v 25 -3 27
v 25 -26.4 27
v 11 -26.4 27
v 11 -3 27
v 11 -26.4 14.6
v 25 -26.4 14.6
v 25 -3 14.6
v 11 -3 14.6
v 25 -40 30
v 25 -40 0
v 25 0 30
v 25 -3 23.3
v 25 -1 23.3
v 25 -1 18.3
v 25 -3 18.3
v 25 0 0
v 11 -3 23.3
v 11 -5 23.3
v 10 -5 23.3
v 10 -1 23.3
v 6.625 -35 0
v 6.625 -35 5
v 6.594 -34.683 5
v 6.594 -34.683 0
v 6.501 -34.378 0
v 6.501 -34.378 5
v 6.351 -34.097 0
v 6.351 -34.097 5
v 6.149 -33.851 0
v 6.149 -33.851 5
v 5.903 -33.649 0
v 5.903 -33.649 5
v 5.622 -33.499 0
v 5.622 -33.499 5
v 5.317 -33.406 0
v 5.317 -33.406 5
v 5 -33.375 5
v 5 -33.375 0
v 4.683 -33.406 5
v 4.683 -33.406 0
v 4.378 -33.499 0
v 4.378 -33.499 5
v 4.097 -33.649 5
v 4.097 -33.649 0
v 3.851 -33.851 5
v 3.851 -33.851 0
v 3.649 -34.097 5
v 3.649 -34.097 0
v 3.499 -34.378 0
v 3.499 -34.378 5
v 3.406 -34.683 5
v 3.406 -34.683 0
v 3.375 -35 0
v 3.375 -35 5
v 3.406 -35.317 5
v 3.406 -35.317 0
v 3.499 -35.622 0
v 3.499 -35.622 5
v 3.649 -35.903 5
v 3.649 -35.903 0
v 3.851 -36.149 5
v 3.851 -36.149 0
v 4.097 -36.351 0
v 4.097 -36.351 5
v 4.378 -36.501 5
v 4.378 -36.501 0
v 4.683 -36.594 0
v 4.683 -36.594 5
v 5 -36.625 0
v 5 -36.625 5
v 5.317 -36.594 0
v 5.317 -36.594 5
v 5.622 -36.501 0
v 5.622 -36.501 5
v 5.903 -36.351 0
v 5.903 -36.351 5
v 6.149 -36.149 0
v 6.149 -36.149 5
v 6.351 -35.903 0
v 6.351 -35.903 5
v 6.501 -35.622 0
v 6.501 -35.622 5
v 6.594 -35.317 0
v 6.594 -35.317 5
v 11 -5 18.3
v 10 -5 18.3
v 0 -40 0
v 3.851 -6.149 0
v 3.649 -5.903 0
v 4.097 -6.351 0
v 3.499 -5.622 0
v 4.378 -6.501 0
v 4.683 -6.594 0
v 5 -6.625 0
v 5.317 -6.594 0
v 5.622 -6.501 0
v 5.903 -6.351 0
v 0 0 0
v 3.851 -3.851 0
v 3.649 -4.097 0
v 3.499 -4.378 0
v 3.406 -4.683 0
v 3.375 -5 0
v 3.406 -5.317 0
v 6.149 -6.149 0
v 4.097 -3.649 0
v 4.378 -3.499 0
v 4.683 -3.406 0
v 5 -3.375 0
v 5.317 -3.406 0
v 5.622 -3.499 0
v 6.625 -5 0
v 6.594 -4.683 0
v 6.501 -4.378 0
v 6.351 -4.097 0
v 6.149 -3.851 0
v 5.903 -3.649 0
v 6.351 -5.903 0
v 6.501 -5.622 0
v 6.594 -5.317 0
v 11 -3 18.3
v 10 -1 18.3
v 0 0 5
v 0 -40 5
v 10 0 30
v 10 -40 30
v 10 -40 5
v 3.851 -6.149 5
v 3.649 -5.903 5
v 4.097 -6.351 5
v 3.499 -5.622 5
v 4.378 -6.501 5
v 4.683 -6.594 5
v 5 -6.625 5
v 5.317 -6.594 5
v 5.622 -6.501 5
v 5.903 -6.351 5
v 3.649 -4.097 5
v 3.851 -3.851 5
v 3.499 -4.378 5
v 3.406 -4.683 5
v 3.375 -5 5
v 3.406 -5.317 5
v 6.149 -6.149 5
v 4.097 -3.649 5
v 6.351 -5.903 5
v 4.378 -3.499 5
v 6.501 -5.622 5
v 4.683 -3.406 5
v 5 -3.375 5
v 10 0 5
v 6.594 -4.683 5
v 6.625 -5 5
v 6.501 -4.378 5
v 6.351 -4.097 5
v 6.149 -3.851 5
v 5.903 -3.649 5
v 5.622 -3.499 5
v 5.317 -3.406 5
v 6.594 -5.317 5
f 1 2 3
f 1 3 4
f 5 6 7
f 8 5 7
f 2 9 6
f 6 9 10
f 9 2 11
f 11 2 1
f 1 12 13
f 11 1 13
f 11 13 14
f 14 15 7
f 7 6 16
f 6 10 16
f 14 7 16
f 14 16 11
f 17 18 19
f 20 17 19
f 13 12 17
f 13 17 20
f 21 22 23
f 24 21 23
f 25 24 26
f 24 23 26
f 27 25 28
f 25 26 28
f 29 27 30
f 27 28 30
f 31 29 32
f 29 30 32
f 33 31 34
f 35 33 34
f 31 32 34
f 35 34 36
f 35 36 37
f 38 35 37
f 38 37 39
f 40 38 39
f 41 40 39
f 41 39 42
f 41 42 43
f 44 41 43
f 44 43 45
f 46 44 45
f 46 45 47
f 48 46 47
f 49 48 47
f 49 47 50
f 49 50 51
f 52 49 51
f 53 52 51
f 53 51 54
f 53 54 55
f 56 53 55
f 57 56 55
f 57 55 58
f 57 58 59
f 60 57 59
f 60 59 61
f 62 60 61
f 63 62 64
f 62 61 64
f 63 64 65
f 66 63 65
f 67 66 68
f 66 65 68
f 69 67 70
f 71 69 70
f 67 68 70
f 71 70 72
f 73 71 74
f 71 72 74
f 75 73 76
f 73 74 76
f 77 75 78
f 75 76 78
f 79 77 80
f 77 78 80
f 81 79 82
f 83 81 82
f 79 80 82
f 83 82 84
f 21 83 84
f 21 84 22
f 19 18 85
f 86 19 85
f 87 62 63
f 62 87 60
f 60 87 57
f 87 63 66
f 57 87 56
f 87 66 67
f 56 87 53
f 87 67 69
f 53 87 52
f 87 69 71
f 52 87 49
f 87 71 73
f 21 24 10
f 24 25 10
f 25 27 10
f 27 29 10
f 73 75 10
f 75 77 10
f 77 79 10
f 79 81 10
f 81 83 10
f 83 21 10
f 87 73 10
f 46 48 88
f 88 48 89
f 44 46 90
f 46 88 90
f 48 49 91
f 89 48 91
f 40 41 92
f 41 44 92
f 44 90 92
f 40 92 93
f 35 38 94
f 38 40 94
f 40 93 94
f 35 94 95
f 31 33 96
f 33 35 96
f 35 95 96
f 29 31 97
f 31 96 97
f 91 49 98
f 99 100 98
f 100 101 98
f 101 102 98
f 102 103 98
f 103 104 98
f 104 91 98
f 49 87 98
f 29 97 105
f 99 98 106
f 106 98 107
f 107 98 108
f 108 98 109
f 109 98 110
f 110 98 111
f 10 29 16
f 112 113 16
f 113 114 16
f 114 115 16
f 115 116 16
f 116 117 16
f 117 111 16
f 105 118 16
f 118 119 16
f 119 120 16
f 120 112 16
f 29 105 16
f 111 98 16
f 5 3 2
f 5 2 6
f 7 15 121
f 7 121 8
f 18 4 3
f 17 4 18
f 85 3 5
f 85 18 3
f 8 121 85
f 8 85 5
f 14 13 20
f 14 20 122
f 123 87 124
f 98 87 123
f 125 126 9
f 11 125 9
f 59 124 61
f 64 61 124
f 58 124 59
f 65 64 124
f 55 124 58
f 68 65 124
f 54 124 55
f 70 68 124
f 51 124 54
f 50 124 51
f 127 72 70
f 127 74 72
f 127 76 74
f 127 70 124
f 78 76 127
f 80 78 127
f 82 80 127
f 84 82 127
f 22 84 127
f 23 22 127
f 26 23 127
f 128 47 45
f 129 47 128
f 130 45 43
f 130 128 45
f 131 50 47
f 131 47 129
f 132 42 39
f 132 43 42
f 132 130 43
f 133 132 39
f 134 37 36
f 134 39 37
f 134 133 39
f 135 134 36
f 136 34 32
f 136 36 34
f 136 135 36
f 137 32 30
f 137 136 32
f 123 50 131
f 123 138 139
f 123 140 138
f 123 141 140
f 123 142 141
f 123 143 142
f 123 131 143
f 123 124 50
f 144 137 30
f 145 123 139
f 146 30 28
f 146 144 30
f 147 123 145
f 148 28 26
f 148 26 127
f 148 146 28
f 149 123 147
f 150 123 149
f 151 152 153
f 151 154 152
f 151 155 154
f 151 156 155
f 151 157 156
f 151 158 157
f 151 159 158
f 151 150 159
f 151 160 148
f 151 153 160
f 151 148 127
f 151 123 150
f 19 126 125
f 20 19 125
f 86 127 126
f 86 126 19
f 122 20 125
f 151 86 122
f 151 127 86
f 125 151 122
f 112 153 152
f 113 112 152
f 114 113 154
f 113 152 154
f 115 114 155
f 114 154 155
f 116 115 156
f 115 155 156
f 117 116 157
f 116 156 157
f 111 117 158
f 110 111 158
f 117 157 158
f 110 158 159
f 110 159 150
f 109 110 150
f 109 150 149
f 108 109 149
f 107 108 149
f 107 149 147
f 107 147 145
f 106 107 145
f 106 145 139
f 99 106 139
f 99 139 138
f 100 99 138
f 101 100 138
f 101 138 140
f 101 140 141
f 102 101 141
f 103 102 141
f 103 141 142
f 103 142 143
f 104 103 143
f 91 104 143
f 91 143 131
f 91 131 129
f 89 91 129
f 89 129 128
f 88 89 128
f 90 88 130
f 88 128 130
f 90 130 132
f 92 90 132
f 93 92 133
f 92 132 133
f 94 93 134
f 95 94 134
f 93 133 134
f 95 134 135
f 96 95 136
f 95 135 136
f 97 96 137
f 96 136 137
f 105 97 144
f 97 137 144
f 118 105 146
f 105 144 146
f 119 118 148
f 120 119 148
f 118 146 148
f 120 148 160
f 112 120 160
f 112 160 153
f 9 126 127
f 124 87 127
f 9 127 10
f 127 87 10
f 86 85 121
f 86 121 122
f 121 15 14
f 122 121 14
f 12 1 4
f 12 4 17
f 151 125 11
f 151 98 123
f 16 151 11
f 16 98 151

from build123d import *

# Parameters (mm, degrees)
ESQUISSE1_W             = 25
ESQUISSE1_H             = 40
BOSS_EXTRU_1_DEPTH      = 5
ESQUISSE2_R             = 1.625
ENL_V_MAT_EXTRU_1_DEPTH = 6
ESQUISSE3_W             = 15
ESQUISSE3_H             = 40
BOSS_EXTRU_2_DEPTH      = 25
ESQUISSE4_W             = 12.4
ESQUISSE4_H             = 23.4
ENL_V_MAT_EXTRU_2_DEPTH = 14
ESQUISSE5_W             = 5
ESQUISSE5_H             = 4
ENL_V_MAT_EXTRU_3_DEPTH = 26


with BuildPart() as part:
    # Esquisse1 → Boss.-Extru.1 (new body)
    with BuildSketch(Plane.XY):
        with Locations((12.5, -20)):
            Rectangle(ESQUISSE1_W, ESQUISSE1_H)
    extrude(amount=BOSS_EXTRU_1_DEPTH)

    # Esquisse2 → Enlèv. mat.-Extru.1 (cut, through all)
    with BuildSketch(Plane.XY.offset(5)):
        with Locations((5, -5)):
            Circle(ESQUISSE2_R)
        with Locations((5, -35)):
            Circle(ESQUISSE2_R)
    extrude(amount=-ENL_V_MAT_EXTRU_1_DEPTH, mode=Mode.SUBTRACT)

    # Esquisse3 → Boss.-Extru.2 (add)
    with BuildSketch(Plane.XY.offset(5)):
        with Locations((17.5, -20)):
            Rectangle(ESQUISSE3_W, ESQUISSE3_H)
    extrude(amount=BOSS_EXTRU_2_DEPTH)

    # Esquisse4 → Enlèv. mat.-Extru.2 (cut)
    with BuildSketch(Plane(origin=(25, 0, 0), x_dir=(0, 0, -1), z_dir=(1, 0, 0))):
        with Locations((-20.8, -14.7)):
            Rectangle(ESQUISSE4_W, ESQUISSE4_H)
    extrude(amount=-ENL_V_MAT_EXTRU_2_DEPTH, mode=Mode.SUBTRACT)

    # Esquisse5 → Enlèv. mat.-Extru.3 (cut, through all)
    with BuildSketch(Plane(origin=(25, 0, 0), x_dir=(0, 0, -1), z_dir=(1, 0, 0))):
        with Locations((-20.8, -3)):
            Rectangle(ESQUISSE5_W, ESQUISSE5_H)
    extrude(amount=-ENL_V_MAT_EXTRU_3_DEPTH, mode=Mode.SUBTRACT)


solid = part.part
